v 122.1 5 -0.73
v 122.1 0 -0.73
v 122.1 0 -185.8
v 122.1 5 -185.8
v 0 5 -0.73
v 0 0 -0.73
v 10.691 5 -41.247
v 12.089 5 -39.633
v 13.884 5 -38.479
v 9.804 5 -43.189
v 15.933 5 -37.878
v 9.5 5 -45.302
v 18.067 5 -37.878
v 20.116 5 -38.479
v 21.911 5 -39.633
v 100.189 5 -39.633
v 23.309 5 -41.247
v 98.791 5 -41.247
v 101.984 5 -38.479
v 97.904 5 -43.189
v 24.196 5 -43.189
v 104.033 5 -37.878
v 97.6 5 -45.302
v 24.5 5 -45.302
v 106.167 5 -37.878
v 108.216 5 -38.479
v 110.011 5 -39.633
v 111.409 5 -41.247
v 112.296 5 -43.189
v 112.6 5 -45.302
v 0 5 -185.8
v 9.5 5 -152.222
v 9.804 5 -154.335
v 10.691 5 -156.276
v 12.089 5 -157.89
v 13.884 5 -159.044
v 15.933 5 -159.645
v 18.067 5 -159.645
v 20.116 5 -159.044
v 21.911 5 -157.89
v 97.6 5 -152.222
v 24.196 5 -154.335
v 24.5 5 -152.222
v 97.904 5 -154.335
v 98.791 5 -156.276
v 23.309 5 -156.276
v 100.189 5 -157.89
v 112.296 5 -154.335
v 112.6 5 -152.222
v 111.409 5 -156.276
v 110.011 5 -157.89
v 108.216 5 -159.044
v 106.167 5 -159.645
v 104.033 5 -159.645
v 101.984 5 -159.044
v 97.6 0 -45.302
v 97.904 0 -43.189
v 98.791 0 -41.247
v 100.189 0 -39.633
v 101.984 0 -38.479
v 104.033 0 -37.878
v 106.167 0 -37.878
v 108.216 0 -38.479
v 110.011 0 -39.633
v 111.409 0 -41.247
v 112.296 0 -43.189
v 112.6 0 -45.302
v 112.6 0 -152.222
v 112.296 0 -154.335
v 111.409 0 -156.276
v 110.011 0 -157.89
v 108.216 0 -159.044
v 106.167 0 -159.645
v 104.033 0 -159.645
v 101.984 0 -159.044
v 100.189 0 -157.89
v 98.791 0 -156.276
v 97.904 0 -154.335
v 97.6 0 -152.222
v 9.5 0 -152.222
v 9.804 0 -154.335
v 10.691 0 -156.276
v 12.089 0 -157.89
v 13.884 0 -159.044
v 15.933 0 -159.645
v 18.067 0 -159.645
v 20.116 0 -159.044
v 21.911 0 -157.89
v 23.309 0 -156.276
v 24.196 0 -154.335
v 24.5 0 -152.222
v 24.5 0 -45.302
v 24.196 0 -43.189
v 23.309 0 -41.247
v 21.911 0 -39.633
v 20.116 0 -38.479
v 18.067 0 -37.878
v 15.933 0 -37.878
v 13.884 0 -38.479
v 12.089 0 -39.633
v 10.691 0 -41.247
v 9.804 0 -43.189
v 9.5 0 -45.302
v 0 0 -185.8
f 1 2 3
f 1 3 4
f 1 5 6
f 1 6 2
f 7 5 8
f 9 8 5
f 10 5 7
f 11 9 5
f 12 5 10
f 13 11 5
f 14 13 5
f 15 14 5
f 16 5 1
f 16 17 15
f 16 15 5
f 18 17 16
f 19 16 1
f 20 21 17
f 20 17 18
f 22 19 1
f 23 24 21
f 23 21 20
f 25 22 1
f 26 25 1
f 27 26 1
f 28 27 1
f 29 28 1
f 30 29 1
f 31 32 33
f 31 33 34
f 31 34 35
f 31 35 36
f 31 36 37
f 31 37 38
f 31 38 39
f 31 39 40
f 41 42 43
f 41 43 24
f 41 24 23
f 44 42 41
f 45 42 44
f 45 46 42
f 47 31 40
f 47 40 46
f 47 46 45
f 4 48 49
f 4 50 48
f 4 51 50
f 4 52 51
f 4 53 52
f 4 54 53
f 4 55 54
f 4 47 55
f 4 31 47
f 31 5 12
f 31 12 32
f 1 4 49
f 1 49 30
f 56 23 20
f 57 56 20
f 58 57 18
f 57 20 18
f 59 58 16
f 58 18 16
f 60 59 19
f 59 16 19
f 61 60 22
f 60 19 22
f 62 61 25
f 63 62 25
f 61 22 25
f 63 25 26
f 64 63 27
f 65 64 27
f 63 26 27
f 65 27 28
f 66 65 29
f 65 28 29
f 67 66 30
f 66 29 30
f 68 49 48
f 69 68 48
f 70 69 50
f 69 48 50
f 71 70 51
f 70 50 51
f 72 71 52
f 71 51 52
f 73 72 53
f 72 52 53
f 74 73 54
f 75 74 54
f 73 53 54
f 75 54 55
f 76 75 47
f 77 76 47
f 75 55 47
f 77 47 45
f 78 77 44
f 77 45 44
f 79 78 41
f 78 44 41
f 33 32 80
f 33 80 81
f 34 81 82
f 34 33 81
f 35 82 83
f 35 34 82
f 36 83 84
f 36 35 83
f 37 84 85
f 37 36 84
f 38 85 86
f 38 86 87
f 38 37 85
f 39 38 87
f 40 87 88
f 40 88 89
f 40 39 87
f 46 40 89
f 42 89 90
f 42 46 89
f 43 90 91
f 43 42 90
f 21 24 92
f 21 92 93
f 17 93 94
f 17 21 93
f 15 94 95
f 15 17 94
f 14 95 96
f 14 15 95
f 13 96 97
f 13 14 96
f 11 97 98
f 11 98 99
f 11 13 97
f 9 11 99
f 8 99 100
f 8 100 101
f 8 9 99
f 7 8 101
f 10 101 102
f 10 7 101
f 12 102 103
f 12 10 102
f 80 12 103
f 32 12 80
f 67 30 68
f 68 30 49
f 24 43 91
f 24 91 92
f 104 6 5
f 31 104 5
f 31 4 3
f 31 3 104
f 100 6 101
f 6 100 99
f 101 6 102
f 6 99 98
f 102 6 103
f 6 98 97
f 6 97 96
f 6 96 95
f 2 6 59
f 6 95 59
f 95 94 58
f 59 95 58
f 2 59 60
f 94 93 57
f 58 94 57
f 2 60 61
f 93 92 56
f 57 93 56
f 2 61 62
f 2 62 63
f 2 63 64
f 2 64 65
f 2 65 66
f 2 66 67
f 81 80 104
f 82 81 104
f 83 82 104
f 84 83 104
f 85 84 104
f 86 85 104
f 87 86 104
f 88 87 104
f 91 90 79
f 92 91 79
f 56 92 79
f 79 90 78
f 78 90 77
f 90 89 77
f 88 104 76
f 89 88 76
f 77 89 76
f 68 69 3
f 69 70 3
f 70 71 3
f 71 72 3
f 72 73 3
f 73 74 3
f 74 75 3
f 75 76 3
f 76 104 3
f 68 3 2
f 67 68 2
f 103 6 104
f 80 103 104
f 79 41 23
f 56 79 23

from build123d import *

# Parameters (mm, degrees)
SKETCH1_W           = 122.1
SKETCH1_H           = 197.8
BOSS_EXTRUDE2_DEPTH = 5
CUT_EXTRUDE1_DEPTH  = 5
SKETCH5_W           = 176.692600263
SKETCH5_H           = 67.834694549
CUT_EXTRUDE2_DEPTH  = 12
SKETCH6_W           = 148.50335492
SKETCH6_H           = 63.858757444
CUT_EXTRUDE3_DEPTH  = 19
SKETCH10_W          = 122.1
SKETCH10_H          = 5
BOSS_EXTRUDE4_DEPTH = 18.27


with BuildPart() as part:
    # Sketch1 → Boss-Extrude2 (new body)
    with BuildSketch(Plane(origin=(0, 0, 0), x_dir=(1, 0, 0), z_dir=(0, 1, 0))):
        with Locations((61.05, 98.9)):
            Rectangle(SKETCH1_W, SKETCH1_H)
    extrude(amount=BOSS_EXTRUDE2_DEPTH)

    # Sketch3 → Cut-Extrude1 (cut)
    with BuildSketch(Plane(origin=(0, 5, 0), x_dir=(1, 0, 0), z_dir=(0, 1, 0))):
        with BuildLine():
            Line((24.5, 45.30156802), (24.5, 152.22156802))
            ThreePointArc((24.5, 152.22156802), (17, 159.72156802), (9.5, 152.22156802))
            Line((9.5, 152.22156802), (9.5, 45.30156802))
            ThreePointArc((9.5, 45.30156802), (17, 37.80156802), (24.5, 45.30156802))
        make_face()
        with BuildLine():
            ThreePointArc((112.6, 152.22156802), (105.1, 159.72156802), (97.6, 152.22156802))
            Line((97.6, 152.22156802), (97.6, 45.30156802))
            ThreePointArc((97.6, 45.30156802), (105.1, 37.80156802), (112.6, 45.30156802))
            Line((112.6, 45.30156802), (112.6, 152.22156802))
        make_face()
    extrude(amount=-CUT_EXTRUDE1_DEPTH, mode=Mode.SUBTRACT)

    # Sketch5 → Cut-Extrude2 (cut)
    with BuildSketch(Plane(origin=(0, 0, -197.8), x_dir=(-1, 0, 0), z_dir=(0, 0, -1))):
        with Locations((-46.708276043, -7.602787765)):
            Rectangle(SKETCH5_W, SKETCH5_H)
    extrude(amount=-CUT_EXTRUDE2_DEPTH, mode=Mode.SUBTRACT)

    # Sketch6 → Cut-Extrude3 (cut)
    with BuildSketch(Plane.XY):
        with Locations((68.056552209, 0.930489014)):
            Rectangle(SKETCH6_W, SKETCH6_H)
    extrude(amount=-CUT_EXTRUDE3_DEPTH, mode=Mode.SUBTRACT)

    # Sketch10 → Boss-Extrude4 (add)
    with BuildSketch(Plane.XY.offset(-19)):
        with Locations((61.05, 2.5)):
            Rectangle(SKETCH10_W, SKETCH10_H)
    extrude(amount=BOSS_EXTRUDE4_DEPTH)


solid = part.part
